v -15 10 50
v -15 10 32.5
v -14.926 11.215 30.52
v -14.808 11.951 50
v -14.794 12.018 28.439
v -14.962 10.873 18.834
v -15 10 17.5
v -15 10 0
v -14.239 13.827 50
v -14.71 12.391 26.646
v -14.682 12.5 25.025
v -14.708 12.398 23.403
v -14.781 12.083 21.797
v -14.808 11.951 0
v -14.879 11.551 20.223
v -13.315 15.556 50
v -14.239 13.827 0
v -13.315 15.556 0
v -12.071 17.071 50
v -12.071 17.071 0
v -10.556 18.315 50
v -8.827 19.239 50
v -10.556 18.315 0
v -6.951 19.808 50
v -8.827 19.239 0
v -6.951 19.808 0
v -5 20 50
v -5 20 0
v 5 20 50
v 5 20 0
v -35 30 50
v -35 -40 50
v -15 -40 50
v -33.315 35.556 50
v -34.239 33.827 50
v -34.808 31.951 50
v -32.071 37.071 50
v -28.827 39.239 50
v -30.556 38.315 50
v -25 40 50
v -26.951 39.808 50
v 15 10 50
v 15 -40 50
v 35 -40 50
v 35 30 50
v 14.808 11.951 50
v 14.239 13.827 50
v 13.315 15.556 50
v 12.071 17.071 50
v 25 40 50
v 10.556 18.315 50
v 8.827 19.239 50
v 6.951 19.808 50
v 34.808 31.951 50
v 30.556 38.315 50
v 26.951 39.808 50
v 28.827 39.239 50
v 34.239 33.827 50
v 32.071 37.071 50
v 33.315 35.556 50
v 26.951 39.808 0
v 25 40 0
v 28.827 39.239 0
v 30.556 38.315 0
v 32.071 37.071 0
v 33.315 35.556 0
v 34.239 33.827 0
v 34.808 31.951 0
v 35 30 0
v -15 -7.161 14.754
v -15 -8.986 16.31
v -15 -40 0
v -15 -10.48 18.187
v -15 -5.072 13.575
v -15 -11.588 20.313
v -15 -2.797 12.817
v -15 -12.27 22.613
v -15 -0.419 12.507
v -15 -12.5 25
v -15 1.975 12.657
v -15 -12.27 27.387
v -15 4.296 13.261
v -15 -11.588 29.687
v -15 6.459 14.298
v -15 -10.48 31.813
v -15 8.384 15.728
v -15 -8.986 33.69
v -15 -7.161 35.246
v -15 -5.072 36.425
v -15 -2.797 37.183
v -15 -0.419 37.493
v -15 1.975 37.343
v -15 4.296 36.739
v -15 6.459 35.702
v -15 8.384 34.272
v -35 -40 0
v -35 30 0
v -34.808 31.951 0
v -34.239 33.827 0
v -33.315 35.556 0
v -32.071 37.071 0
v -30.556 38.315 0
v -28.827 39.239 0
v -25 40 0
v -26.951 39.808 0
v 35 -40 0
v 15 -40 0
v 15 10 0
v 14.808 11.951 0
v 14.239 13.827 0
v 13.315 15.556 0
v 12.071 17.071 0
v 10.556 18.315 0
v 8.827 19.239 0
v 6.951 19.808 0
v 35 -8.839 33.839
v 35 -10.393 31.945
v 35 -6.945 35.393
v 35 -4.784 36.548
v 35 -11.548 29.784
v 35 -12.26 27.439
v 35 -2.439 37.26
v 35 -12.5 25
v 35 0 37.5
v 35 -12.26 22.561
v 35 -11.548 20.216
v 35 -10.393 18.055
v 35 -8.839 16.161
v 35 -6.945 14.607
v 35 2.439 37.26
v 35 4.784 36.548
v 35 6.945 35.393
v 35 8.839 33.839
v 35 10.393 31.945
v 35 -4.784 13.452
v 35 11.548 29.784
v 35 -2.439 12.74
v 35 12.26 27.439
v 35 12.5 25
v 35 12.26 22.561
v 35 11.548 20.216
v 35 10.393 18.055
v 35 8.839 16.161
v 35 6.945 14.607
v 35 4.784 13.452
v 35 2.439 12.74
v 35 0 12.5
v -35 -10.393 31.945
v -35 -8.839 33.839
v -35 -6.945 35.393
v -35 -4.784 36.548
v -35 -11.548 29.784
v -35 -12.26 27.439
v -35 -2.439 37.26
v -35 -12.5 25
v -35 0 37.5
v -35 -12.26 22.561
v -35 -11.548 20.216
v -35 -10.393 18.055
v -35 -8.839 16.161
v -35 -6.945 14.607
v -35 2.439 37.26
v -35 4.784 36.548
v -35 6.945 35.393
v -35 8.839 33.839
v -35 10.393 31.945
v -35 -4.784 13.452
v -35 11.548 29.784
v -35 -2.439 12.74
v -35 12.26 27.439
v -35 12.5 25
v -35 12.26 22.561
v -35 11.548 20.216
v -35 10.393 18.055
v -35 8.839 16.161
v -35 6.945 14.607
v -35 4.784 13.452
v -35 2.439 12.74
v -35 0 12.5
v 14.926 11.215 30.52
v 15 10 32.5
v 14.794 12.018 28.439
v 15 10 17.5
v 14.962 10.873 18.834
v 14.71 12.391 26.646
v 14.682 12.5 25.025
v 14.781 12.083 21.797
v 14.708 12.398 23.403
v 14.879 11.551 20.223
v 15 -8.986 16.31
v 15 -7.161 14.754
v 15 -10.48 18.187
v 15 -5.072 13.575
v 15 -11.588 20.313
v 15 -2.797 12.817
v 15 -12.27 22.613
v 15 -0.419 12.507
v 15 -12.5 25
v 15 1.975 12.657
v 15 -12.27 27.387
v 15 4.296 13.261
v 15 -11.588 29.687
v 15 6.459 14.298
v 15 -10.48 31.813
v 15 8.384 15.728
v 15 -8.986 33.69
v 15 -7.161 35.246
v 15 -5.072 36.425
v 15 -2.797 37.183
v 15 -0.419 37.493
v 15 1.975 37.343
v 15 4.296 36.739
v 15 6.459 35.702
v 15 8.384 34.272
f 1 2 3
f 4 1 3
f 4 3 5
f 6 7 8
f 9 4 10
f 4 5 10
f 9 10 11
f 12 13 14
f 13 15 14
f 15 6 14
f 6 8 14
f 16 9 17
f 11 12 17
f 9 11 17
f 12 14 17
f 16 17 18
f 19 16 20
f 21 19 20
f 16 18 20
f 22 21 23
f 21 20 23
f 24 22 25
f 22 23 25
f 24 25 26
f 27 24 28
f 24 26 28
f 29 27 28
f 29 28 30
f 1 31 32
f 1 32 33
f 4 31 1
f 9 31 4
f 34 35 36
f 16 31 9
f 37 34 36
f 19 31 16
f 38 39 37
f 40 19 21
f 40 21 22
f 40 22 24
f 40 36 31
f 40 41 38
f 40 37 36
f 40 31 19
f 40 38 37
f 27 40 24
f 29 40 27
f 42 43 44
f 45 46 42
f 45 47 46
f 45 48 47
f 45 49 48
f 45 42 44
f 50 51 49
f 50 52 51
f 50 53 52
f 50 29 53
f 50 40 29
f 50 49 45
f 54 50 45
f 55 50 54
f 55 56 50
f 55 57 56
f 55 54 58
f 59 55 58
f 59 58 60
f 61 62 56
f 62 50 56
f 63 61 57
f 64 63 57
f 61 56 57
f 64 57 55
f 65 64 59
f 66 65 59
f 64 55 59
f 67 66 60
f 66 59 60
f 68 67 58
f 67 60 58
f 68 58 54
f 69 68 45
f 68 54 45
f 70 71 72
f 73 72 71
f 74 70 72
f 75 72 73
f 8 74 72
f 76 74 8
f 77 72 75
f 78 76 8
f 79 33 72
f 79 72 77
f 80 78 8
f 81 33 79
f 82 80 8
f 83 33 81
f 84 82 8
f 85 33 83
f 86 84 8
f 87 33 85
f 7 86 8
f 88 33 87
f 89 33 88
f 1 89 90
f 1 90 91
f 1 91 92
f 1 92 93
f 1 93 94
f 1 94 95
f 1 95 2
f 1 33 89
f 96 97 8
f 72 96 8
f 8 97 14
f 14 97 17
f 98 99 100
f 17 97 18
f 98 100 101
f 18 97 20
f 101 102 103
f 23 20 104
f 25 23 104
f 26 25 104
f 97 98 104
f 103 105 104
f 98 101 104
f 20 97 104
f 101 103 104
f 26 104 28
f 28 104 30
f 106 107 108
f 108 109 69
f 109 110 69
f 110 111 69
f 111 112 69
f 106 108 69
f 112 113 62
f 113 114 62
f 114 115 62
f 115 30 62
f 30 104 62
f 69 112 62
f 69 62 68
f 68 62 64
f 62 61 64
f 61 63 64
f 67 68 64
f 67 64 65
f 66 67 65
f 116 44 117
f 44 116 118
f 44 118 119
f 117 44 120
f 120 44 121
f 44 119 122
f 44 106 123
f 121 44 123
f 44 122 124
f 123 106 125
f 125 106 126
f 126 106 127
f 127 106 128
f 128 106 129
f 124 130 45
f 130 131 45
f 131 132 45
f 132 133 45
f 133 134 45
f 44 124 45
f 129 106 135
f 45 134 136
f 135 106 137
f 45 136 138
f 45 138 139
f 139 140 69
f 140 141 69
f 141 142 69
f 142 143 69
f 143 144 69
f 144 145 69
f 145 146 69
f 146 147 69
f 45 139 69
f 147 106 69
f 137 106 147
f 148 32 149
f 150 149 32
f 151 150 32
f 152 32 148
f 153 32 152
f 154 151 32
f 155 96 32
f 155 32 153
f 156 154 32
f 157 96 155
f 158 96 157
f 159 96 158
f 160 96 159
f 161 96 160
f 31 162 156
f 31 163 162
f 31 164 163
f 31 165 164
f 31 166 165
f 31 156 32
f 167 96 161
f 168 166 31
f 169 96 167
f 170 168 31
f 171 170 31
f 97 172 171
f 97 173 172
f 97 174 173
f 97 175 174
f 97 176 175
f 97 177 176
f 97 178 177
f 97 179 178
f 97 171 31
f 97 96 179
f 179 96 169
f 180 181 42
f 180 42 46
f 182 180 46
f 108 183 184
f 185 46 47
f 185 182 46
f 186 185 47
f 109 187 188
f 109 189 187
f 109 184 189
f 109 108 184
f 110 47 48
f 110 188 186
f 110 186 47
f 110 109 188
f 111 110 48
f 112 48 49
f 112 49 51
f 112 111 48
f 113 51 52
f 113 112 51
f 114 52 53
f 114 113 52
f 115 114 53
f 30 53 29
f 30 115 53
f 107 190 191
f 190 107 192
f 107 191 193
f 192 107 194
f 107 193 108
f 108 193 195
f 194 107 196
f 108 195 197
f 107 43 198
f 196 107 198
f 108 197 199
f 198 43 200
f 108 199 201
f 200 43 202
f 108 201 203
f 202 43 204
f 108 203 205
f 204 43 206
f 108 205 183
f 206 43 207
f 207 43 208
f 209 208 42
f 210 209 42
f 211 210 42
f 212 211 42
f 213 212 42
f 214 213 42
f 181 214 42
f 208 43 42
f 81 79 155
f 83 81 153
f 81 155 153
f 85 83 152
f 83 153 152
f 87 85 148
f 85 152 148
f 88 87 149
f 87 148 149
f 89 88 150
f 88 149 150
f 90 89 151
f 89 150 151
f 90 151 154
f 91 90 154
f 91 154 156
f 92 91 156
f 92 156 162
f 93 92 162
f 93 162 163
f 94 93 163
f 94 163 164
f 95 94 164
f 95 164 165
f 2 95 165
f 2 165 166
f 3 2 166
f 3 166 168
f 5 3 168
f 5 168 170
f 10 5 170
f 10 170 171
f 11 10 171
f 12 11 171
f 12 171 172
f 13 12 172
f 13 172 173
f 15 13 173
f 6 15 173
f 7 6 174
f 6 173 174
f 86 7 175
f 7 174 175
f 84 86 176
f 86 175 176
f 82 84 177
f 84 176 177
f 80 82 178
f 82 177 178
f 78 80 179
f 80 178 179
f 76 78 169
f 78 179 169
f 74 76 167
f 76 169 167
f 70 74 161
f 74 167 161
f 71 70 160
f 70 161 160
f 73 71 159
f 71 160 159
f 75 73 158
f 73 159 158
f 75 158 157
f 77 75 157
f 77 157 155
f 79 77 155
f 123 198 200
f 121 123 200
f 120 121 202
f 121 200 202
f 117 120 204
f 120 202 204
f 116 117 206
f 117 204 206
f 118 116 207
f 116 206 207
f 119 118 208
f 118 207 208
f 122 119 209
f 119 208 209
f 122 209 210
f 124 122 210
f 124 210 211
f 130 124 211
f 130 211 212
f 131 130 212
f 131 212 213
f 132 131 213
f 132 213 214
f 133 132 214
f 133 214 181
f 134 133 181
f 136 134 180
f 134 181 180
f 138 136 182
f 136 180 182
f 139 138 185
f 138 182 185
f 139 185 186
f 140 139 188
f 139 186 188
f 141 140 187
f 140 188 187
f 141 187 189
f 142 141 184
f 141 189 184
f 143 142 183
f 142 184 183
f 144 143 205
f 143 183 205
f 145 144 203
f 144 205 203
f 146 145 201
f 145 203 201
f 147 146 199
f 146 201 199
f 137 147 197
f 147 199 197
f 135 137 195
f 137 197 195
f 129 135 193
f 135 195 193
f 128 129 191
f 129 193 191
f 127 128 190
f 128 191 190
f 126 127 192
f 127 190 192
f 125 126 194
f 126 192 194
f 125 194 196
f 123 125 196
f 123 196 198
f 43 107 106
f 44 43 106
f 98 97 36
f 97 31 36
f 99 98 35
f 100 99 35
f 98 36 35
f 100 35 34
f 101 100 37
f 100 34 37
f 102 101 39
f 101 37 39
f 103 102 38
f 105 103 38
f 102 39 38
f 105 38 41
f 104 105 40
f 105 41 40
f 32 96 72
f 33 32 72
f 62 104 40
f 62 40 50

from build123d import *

# Parameters (mm, degrees)
F0_W     = 70
F0_H     = 80
F1_DEPTH = 50
F2_W     = 30
F2_H     = 60
F3_DEPTH = 64
F4_R     = 10
F5_R     = 12.5
F6_DEPTH = 96.7


with BuildPart() as f1:
    # F0 (on Top) → F1 (new body)
    with BuildSketch(Plane.XY):
        Rectangle(F0_W, F0_H)
    extrude(amount=F1_DEPTH)

    # F2 (on face) → F3 (cut)
    with BuildSketch(Plane.XY.offset(50)):
        with Locations((0, -10)):
            Rectangle(F2_W, F2_H)
    extrude(amount=-F3_DEPTH, mode=Mode.SUBTRACT)

    # F4
    f4_edges = [f1.edges().sort_by_distance(p)[0] for p in [
        (35, 40, 25),
        (-35, 40, 25),
        (-15, 20, 25),
        (15, 20, 25),
    ]]
    fillet(f4_edges, radius=F4_R)

    # F5 (on face) → F6 (cut)
    with BuildSketch(Plane(origin=(-35, 0, 0), x_dir=(0, -1, 0), z_dir=(-1, 0, 0))):
        with Locations((0, 25)):
            Circle(F5_R)
    extrude(amount=-F6_DEPTH, mode=Mode.SUBTRACT)


solid = f1.part
